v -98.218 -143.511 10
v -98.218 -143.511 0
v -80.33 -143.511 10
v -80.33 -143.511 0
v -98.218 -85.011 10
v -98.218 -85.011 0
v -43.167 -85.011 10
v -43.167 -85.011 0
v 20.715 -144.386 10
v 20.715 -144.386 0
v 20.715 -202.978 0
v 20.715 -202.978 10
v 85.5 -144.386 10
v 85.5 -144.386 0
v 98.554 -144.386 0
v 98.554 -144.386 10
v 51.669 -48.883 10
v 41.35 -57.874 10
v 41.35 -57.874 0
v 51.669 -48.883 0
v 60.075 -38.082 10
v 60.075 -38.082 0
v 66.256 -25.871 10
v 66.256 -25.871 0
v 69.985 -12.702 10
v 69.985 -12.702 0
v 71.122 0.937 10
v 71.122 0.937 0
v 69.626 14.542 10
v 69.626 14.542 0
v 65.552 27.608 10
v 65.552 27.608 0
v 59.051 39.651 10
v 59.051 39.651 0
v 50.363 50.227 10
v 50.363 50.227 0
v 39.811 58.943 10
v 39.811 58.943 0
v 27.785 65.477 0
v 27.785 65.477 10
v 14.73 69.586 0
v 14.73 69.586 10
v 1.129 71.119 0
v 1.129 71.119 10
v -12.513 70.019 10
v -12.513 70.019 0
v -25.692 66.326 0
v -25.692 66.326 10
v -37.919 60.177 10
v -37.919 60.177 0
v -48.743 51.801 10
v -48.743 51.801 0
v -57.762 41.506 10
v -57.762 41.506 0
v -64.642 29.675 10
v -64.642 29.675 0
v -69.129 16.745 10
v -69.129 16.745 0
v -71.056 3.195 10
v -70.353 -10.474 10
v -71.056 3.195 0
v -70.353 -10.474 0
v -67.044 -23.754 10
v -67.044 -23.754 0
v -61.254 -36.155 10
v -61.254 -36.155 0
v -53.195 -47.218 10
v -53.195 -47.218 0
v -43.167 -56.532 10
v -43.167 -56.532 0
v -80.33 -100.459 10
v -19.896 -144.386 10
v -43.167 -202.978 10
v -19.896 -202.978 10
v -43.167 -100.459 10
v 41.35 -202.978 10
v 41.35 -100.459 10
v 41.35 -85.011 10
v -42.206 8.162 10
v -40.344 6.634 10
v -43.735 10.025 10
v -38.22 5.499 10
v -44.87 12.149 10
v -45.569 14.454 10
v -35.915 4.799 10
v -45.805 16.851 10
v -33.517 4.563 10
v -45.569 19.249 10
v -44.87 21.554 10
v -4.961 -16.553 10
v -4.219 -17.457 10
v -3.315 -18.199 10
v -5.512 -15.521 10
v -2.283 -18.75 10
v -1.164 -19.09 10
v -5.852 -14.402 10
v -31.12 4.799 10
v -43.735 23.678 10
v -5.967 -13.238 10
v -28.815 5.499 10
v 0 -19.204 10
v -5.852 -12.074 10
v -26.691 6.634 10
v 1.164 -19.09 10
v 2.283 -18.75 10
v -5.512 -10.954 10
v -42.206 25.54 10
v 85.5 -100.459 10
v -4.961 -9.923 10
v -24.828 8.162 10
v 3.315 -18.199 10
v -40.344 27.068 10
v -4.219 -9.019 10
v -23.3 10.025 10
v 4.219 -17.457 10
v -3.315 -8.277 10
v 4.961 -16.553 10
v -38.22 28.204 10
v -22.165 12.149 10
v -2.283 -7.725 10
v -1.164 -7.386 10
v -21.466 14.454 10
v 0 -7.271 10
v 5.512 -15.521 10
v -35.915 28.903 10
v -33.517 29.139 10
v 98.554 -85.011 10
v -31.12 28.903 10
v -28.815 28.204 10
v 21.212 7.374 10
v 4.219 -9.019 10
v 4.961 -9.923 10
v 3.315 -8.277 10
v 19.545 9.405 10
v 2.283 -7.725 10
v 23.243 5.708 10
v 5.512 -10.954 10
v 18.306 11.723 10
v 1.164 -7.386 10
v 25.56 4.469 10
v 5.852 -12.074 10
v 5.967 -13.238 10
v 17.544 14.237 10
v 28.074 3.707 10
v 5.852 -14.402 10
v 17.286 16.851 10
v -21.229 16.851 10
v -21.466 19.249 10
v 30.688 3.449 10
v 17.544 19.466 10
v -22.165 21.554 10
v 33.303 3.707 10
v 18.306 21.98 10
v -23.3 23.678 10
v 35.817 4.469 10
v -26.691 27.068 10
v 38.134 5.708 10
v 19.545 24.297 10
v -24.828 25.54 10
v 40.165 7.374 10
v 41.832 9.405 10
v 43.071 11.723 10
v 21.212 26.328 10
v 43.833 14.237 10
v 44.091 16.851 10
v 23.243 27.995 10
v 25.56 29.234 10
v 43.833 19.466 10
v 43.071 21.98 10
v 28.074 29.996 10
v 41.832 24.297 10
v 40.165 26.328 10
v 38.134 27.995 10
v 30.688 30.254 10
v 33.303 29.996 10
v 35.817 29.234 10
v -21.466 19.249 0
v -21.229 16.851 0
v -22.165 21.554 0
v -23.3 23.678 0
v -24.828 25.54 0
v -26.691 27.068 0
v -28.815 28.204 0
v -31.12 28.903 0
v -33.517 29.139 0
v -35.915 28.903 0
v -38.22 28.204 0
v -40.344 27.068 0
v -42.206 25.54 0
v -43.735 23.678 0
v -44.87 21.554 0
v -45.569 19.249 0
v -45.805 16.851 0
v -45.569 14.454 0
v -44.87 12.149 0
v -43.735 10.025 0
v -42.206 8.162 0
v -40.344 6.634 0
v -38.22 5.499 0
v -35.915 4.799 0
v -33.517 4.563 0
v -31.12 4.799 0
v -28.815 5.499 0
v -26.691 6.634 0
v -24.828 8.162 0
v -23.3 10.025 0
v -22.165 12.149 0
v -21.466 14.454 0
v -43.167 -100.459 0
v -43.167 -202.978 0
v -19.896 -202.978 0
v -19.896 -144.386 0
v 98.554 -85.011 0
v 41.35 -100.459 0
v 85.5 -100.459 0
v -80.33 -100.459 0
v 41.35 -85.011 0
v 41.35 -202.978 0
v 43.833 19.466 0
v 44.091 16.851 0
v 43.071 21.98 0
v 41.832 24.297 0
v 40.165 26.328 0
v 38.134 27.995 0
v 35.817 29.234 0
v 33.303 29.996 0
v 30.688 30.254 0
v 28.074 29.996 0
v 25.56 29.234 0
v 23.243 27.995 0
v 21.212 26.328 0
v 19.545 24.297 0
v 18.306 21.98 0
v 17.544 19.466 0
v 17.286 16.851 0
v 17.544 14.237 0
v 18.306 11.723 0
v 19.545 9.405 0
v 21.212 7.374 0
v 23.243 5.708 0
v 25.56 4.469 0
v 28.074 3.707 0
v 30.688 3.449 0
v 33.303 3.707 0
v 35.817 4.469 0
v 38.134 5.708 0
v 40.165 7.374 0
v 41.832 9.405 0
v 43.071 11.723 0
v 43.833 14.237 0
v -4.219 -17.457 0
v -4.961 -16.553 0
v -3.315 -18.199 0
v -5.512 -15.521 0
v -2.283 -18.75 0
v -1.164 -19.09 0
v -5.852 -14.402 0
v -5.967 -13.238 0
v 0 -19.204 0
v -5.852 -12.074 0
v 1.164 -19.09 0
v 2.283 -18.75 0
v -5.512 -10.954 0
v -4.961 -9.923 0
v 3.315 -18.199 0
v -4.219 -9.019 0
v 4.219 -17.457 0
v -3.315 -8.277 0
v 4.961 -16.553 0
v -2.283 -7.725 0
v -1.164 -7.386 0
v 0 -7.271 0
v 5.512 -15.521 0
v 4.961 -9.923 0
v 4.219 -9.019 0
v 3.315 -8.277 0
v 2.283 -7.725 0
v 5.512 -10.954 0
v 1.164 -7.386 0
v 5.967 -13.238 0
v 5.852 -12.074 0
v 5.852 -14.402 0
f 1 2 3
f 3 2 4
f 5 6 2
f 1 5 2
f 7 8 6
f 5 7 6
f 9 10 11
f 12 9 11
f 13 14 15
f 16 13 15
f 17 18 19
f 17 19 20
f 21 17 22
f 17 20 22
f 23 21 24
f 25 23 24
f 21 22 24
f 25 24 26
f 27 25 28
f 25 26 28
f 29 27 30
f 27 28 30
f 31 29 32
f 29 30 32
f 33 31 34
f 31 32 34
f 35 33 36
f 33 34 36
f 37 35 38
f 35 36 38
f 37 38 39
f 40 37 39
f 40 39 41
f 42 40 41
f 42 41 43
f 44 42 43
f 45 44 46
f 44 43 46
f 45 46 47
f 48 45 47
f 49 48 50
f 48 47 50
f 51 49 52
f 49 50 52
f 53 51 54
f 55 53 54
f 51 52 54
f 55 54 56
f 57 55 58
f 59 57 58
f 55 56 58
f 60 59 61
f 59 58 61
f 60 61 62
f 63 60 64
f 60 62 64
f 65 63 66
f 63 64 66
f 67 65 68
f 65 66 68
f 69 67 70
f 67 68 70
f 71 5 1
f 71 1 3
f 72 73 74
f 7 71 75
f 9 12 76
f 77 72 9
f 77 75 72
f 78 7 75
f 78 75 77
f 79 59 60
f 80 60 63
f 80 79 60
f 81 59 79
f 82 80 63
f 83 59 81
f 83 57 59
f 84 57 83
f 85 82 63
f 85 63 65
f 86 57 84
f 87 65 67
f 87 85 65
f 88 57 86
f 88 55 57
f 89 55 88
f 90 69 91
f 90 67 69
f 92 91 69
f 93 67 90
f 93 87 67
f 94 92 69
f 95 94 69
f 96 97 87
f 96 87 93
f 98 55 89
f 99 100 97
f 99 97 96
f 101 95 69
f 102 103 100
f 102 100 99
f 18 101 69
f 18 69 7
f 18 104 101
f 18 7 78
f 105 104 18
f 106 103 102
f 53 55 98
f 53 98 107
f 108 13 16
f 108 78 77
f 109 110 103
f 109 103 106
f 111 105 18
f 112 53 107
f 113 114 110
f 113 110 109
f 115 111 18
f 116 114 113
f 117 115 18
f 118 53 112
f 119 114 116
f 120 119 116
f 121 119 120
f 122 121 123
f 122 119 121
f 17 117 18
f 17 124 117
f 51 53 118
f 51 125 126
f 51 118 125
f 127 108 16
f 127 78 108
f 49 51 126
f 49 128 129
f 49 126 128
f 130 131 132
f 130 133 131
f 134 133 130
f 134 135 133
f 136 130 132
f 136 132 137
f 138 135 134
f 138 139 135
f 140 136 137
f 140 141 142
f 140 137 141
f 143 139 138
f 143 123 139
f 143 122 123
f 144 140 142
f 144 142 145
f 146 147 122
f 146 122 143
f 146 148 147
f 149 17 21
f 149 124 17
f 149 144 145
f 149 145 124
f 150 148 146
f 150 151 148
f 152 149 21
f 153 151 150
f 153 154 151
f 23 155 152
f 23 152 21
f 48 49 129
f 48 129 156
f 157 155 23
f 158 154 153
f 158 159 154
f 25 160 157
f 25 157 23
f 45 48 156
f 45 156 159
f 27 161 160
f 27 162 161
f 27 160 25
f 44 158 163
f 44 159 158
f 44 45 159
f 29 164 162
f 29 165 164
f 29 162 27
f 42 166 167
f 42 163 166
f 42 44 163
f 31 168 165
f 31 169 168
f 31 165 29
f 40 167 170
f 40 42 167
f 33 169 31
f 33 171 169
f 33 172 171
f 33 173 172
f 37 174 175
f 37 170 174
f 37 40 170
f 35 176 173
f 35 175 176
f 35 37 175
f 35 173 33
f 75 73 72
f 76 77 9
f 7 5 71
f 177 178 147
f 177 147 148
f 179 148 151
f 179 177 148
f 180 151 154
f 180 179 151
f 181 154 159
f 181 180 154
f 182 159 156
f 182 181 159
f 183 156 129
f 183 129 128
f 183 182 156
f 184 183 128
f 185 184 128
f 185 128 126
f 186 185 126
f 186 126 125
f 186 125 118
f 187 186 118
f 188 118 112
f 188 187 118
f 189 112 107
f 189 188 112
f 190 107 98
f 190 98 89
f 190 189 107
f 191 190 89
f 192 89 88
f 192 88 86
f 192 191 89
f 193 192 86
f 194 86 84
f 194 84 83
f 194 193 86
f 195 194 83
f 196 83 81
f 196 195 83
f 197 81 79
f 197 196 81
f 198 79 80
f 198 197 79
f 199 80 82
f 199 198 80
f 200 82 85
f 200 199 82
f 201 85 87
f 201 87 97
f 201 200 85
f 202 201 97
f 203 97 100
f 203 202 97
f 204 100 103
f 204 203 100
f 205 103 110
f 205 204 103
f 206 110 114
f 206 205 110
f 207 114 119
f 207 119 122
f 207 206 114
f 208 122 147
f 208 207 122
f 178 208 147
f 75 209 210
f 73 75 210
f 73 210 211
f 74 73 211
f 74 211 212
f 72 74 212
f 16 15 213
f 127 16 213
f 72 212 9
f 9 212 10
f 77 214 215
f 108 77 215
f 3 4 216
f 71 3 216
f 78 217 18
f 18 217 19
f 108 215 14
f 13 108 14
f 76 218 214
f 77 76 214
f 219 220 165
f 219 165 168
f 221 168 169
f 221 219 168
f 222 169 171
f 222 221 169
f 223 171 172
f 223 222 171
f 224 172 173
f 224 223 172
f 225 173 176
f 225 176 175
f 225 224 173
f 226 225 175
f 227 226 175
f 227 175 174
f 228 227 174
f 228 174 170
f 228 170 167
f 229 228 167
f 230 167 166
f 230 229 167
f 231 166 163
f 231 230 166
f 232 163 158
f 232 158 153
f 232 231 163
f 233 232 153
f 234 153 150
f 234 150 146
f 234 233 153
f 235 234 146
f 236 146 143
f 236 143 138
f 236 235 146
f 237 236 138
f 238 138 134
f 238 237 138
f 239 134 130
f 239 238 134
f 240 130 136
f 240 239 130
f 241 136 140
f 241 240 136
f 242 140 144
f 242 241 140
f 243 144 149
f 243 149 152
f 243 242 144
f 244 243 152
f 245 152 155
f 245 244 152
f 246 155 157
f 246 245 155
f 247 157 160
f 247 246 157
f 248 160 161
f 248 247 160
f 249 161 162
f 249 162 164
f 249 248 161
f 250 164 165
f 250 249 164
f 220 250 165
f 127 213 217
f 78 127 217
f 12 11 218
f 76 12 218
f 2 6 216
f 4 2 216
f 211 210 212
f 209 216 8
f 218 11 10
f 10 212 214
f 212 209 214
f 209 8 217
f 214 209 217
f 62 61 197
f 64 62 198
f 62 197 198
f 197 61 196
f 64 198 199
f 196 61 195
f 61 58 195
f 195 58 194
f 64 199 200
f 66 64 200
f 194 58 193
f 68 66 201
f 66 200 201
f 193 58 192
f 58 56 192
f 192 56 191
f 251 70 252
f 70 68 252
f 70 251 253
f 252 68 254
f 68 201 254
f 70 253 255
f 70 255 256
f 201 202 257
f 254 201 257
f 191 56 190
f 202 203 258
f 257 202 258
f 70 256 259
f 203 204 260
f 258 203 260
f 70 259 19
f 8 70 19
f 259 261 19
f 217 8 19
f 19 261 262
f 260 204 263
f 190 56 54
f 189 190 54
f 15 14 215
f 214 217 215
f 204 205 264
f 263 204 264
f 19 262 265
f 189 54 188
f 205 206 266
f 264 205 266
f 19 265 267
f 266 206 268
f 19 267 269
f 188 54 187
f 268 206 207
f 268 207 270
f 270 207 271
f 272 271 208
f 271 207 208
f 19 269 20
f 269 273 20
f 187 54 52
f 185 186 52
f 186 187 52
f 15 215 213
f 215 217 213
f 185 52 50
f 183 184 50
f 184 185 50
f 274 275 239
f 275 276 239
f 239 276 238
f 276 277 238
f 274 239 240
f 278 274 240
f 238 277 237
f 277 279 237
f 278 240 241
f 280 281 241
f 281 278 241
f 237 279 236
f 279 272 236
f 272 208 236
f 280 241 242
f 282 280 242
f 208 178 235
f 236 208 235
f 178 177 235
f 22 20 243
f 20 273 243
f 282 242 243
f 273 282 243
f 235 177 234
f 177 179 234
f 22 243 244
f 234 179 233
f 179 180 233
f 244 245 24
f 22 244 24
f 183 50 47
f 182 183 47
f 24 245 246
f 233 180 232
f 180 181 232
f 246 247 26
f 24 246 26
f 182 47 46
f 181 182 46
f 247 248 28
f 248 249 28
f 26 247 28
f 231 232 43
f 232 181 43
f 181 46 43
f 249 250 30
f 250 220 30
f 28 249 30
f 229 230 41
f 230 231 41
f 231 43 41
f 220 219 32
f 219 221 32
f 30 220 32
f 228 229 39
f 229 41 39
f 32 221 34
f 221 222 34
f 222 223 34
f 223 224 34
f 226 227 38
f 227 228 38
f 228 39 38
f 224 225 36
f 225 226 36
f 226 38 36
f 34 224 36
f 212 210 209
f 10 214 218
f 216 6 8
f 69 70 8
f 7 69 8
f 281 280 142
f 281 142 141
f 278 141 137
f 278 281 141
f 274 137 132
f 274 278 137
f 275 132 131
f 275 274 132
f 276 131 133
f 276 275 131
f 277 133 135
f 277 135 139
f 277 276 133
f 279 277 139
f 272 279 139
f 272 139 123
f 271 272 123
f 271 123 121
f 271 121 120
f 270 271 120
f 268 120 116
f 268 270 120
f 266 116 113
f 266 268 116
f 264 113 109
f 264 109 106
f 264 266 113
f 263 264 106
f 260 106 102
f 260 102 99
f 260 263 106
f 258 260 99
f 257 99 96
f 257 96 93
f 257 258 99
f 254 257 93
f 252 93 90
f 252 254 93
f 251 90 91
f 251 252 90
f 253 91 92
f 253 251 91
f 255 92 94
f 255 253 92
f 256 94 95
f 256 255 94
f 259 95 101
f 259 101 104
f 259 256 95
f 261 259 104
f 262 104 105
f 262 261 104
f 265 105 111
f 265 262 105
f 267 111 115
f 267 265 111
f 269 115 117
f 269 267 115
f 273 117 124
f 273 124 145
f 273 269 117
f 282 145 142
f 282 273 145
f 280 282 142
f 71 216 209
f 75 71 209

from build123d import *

# Parameters (mm, degrees)
SKETCH1_R           = 12.288018633
SKETCH1_R_2         = 13.402342443
SKETCH1_R_3         = 5.966655134
BOSS_EXTRUDE1_DEPTH = 10


with BuildPart() as part:
    # Sketch1 → Boss-Extrude1 (new body)
    with BuildSketch(Plane.XY):
        with BuildLine():
            Line((-43.16670826, -100.459006624), (-43.16670826, -144.386357681))
            Line((-43.16670826, -144.386357681), (-43.16670826, -202.977586365))
            Line((-43.16670826, -202.977586365), (-19.89608029, -202.977586365))
            Line((-19.89608029, -202.977586365), (-19.89608029, -144.386357681))
            Line((-19.89608029, -144.386357681), (20.715262102, -144.386357681))
            Line((20.715262102, -144.386357681), (20.715262102, -202.977586365))
            Line((20.715262102, -202.977586365), (41.349988273, -202.977586365))
            Line((41.349988273, -202.977586365), (41.349988273, -144.386357681))
            Line((41.349988273, -144.386357681), (41.349988273, -100.459006624))
            Line((41.349988273, -100.459006624), (85.500022586, -100.459006624))
            Line((85.500022586, -100.459006624), (85.500022586, -144.386357681))
            Line((85.500022586, -144.386357681), (98.553668355, -144.386357681))
            Line((98.553668355, -144.386357681), (98.553668355, -100.459006624))
            Line((98.553668355, -100.459006624), (98.553668355, -85.011306082))
            Line((98.553668355, -85.011306082), (41.349988273, -85.011306082))
            Line((41.349988273, -85.011306082), (41.349988273, -57.873752711))
            ThreePointArc((41.349988273, -57.873752711), (1.129346742, 71.119036544), (-43.16670826, -56.531655566))
            Line((-43.16670826, -56.531655566), (-43.16670826, -85.011306082))
            Line((-43.16670826, -85.011306082), (-98.217954904, -85.011306082))
            Line((-98.217954904, -85.011306082), (-98.217954904, -100.459006624))
            Line((-98.217954904, -100.459006624), (-98.217954904, -143.510977861))
            Line((-98.217954904, -143.510977861), (-80.329625517, -143.510977861))
            Line((-80.329625517, -143.510977861), (-80.329625517, -100.459006624))
            Line((-80.329625517, -100.459006624), (-43.16670826, -100.459006624))
        make_face()
        with Locations((-33.517420804, 16.851364033)):
            Circle(SKETCH1_R, mode=Mode.SUBTRACT)
        with Locations((30.688490145, 16.851364033)):
            Circle(SKETCH1_R_2, mode=Mode.SUBTRACT)
        with Locations((0, -13.237752907)):
            Circle(SKETCH1_R_3, mode=Mode.SUBTRACT)
    extrude(amount=BOSS_EXTRUDE1_DEPTH)


solid = part.part
